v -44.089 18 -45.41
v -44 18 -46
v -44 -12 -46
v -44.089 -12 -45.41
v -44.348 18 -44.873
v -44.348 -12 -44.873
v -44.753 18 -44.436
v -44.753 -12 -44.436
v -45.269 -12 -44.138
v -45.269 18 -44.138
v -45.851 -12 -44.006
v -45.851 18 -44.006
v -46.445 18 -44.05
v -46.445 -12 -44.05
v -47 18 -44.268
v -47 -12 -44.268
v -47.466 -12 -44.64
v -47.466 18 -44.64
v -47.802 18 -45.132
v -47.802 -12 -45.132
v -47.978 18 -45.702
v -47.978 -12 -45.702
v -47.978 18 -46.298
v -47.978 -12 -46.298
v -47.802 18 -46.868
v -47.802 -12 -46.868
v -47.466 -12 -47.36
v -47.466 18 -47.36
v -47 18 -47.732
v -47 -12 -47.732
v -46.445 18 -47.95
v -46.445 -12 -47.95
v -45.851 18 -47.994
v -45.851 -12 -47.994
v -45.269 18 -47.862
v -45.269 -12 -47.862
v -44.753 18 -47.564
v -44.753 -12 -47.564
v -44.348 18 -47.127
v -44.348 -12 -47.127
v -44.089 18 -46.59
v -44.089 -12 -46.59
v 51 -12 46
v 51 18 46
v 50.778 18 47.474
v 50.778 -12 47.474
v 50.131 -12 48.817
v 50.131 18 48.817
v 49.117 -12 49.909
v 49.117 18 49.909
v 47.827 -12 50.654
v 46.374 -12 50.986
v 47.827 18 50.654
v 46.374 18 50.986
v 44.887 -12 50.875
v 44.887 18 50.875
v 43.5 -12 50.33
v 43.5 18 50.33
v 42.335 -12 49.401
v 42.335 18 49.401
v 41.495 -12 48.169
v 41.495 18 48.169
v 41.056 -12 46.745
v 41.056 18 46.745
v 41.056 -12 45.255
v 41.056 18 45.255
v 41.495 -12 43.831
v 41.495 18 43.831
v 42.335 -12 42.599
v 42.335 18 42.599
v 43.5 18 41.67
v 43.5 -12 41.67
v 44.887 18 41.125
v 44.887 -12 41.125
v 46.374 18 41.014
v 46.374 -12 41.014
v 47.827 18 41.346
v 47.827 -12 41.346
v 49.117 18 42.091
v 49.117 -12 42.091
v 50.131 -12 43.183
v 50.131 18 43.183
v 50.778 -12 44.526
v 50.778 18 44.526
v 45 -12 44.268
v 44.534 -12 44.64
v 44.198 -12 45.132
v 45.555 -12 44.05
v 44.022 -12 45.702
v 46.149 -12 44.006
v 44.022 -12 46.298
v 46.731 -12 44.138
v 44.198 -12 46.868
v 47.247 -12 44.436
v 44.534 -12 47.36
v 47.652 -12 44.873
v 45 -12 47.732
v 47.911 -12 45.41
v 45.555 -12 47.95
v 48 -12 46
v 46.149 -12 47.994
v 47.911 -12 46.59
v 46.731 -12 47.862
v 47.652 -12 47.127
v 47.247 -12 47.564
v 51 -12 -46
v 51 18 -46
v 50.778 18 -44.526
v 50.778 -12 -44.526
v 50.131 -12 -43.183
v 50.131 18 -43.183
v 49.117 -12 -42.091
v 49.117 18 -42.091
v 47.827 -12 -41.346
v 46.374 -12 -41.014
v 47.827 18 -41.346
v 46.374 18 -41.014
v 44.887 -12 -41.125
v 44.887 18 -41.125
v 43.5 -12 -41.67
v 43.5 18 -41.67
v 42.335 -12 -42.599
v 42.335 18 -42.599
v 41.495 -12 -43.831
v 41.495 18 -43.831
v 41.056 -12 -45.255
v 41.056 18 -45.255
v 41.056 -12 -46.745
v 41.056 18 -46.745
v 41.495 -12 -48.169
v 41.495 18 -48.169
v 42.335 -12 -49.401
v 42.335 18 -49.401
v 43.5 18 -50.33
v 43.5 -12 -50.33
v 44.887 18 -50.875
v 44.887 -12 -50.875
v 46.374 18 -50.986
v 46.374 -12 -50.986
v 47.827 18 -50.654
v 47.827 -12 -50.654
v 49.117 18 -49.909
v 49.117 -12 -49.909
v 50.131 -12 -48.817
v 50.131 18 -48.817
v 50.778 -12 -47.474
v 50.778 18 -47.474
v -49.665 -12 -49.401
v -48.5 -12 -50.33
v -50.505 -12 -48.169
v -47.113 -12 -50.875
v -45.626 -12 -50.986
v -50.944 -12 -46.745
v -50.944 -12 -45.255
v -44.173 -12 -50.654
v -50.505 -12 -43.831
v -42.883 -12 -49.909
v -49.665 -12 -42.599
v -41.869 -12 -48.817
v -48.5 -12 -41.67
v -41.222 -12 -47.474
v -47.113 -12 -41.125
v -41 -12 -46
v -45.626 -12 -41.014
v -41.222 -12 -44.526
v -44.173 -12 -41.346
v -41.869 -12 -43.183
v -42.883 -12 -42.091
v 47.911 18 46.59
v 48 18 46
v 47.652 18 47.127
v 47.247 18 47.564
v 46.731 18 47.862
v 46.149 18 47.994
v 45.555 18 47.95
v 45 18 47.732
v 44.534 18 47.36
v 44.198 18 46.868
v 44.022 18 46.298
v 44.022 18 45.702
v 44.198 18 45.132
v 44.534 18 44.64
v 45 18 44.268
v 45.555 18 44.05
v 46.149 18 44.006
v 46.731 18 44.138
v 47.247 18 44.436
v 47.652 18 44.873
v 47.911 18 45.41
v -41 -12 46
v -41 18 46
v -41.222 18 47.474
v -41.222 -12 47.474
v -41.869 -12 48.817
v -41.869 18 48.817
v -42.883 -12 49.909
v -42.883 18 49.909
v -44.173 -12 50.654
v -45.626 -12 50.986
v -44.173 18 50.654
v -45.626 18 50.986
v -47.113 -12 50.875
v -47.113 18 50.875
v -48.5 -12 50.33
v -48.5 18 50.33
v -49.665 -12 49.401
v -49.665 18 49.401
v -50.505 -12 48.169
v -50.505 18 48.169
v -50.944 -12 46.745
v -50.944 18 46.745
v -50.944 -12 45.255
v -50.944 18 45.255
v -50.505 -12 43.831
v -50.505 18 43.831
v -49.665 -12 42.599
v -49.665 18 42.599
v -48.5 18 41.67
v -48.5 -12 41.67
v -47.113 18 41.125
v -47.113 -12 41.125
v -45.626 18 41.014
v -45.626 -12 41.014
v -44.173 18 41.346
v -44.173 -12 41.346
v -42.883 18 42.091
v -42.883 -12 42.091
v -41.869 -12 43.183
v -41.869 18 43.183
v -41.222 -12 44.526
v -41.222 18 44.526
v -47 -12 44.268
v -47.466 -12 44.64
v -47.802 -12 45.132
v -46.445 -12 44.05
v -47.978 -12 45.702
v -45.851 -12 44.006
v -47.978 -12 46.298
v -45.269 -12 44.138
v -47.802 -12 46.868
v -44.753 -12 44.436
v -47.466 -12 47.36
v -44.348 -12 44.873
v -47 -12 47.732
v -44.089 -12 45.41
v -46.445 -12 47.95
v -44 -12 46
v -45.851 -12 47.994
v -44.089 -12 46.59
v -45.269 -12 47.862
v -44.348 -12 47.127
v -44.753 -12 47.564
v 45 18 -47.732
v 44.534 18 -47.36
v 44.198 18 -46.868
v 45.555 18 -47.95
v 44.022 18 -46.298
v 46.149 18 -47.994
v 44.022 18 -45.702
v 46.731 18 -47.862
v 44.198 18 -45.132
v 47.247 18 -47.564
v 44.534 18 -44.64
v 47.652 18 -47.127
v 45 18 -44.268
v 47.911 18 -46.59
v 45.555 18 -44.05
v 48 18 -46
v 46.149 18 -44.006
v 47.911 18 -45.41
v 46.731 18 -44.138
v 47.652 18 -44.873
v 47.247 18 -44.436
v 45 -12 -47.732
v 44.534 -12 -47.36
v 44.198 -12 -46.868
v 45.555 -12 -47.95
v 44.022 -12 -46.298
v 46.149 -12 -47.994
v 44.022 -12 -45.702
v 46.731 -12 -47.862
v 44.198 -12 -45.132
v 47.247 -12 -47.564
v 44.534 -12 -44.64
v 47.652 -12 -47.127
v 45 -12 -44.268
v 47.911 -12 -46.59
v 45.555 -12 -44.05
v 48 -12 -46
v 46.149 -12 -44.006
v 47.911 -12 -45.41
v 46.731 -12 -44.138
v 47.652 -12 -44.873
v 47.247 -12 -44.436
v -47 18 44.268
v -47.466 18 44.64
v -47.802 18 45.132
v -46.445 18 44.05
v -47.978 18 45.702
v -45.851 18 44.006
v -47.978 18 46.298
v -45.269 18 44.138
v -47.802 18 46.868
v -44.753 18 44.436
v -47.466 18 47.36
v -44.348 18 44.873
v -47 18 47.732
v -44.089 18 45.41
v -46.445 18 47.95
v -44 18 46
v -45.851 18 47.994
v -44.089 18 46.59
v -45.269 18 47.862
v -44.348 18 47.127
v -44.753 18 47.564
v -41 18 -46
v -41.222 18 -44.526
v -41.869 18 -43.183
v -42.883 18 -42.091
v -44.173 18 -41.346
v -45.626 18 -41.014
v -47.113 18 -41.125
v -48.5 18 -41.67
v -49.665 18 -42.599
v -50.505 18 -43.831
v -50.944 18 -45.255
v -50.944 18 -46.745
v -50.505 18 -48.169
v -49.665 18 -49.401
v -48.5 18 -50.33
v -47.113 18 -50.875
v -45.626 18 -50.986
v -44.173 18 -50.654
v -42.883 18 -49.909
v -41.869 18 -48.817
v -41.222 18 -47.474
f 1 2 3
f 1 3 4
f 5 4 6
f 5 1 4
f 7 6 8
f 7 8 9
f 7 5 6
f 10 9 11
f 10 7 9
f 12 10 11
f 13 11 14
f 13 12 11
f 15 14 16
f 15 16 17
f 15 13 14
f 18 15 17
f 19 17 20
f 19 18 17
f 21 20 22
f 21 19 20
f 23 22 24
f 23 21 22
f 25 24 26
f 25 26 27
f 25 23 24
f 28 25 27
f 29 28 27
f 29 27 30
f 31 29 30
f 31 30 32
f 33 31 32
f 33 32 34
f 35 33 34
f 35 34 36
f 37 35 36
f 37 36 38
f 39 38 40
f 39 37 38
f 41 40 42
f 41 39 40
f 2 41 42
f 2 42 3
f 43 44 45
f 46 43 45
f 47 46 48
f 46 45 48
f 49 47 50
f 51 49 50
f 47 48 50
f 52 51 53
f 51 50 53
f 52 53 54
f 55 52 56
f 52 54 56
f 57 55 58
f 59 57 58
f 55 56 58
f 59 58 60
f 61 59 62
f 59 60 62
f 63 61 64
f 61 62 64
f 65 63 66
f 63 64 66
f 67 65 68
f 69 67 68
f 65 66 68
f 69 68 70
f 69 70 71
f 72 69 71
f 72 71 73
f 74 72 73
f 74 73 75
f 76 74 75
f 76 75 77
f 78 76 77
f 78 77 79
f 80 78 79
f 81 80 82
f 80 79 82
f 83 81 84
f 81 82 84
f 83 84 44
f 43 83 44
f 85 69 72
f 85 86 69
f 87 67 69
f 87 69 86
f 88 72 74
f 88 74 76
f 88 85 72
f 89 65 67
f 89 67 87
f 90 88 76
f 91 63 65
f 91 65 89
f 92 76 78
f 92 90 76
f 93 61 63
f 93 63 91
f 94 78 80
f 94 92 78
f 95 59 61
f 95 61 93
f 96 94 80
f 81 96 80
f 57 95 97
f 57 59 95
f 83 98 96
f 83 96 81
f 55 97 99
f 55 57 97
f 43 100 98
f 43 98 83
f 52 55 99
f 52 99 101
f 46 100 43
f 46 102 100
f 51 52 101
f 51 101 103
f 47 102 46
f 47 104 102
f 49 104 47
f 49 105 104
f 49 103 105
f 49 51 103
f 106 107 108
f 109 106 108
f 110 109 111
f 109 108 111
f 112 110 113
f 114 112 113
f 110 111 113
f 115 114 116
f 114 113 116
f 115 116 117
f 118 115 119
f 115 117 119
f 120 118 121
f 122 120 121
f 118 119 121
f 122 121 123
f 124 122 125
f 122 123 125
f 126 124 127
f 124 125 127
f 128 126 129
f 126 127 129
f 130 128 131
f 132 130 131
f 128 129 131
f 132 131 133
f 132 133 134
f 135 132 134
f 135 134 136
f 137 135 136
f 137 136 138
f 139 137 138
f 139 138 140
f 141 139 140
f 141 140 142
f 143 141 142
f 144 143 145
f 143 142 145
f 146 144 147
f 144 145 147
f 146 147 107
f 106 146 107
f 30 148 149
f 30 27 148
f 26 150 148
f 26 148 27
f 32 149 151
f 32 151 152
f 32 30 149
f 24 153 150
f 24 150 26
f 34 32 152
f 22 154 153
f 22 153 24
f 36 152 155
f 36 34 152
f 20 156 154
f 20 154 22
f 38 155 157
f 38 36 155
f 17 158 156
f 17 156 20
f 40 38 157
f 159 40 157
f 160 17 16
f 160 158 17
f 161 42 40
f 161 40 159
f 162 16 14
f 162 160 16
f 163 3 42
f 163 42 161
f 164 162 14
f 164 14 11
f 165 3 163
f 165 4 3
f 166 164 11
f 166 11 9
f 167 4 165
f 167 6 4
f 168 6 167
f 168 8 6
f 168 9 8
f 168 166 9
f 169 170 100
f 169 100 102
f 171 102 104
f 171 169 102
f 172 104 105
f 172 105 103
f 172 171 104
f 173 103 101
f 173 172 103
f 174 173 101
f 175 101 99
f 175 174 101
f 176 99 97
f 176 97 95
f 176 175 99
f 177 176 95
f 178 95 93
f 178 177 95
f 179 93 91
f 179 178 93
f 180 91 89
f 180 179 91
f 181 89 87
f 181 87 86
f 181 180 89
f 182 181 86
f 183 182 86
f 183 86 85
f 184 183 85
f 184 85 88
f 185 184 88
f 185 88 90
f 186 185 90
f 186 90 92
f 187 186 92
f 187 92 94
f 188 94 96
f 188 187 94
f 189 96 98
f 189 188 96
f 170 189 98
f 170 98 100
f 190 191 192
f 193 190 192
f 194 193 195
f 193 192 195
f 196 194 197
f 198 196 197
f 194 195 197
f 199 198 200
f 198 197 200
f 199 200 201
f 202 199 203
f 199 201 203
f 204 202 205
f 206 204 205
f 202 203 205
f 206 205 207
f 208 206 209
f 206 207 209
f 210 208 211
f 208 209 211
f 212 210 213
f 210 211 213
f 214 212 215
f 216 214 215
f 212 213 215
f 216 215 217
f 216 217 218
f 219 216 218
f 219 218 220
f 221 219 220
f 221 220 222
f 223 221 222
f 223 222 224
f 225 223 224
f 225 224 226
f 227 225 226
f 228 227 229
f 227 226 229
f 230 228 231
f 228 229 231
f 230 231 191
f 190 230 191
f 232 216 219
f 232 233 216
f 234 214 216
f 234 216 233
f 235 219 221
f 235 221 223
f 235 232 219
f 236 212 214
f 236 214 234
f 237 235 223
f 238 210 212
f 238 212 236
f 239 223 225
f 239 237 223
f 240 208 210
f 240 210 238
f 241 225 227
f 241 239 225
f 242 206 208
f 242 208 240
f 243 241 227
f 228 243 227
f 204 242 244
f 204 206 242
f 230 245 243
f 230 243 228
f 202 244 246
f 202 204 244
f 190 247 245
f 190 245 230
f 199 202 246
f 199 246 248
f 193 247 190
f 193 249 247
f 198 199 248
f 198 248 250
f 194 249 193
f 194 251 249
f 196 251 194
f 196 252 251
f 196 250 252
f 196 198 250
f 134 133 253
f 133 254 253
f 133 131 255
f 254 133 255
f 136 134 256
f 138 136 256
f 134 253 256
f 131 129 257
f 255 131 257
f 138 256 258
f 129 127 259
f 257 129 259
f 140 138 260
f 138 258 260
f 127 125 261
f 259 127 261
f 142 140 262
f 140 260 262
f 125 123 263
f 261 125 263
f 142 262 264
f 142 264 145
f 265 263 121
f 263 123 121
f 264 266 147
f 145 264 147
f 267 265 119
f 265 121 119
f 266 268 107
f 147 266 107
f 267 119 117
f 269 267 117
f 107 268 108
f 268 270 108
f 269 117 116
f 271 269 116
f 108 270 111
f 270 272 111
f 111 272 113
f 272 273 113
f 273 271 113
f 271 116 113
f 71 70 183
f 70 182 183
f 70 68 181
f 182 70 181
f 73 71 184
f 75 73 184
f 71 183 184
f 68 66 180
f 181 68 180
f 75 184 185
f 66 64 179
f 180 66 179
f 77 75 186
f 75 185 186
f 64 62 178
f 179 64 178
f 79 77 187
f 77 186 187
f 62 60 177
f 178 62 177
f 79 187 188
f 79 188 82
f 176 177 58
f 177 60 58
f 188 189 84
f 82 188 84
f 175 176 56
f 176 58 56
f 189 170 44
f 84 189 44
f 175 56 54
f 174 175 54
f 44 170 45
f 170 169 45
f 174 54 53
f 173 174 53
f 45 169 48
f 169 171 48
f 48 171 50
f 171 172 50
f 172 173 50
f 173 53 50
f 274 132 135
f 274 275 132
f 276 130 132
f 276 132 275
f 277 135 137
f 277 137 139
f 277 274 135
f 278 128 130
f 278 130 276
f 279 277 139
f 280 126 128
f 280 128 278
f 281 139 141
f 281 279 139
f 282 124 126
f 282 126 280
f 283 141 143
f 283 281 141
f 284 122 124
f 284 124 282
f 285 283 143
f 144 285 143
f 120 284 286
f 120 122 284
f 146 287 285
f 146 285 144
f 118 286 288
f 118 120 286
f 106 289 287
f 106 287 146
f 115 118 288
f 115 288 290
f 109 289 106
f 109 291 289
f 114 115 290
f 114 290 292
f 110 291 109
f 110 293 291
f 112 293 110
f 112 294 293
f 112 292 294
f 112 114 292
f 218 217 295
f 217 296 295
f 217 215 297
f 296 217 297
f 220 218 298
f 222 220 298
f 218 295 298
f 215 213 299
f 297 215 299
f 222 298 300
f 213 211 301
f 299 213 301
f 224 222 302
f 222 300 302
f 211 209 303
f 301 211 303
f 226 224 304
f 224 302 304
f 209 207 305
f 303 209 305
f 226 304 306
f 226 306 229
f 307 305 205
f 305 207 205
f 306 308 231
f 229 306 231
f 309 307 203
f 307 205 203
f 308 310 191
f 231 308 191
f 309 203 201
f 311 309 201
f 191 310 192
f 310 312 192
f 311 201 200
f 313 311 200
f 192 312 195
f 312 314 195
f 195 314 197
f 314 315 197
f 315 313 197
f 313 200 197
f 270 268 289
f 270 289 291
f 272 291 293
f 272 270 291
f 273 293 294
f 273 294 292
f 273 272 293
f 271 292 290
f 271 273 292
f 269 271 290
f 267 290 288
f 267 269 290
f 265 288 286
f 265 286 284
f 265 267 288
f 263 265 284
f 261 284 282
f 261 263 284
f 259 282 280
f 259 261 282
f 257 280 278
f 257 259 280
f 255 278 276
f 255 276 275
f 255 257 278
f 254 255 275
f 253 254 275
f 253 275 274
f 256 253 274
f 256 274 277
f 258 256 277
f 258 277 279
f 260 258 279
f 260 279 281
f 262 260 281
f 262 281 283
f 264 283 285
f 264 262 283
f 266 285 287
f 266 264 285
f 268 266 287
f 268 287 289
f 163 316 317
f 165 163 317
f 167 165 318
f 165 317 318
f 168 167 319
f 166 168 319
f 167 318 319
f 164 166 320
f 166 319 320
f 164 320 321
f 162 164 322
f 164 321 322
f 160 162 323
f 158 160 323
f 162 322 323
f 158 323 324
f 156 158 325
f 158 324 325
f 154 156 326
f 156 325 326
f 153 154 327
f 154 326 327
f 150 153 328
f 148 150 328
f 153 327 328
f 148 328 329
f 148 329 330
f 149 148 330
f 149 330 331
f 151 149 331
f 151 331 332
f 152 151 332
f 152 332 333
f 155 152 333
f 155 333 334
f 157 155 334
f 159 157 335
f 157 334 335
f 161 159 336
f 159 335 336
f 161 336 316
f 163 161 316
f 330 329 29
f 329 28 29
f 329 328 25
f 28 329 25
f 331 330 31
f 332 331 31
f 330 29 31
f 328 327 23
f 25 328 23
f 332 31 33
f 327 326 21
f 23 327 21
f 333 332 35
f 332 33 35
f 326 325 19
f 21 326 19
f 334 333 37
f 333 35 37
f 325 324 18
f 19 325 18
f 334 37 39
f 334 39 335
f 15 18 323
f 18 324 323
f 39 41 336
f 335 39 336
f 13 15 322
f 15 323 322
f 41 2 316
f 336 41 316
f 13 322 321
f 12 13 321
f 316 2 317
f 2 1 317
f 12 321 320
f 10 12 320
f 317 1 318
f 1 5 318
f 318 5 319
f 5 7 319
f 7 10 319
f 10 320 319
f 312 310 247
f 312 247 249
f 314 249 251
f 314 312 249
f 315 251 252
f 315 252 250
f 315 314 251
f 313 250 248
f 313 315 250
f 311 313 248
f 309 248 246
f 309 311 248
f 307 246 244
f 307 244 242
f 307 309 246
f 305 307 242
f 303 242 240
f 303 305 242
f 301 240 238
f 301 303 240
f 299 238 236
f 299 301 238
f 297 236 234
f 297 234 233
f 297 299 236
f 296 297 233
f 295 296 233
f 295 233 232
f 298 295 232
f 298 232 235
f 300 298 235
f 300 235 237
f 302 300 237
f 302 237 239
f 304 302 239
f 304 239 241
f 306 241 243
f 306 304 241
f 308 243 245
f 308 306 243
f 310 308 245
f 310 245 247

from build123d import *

# Parameters (mm, degrees)
TUBE001_R     = 5
TUBE001_R_2   = 2
TUBE001_DEPTH = 30
TUBE002_R     = 5
TUBE002_R_2   = 2
TUBE002_DEPTH = 30
TUBE003_R     = 5
TUBE003_R_2   = 2
TUBE003_DEPTH = 30
TUBE_R        = 5
TUBE_R_2      = 2
TUBE_DEPTH    = 30


with BuildPart() as tube001:
    # Tube001 → Tube001 (new body)
    with BuildSketch(Plane(origin=(-46, 18, 46), x_dir=(1, 0, 0), z_dir=(0, -1, 0))):
        Circle(TUBE001_R)
        Circle(TUBE001_R_2, mode=Mode.SUBTRACT)
    extrude(amount=TUBE001_DEPTH)


with BuildPart() as tube002:
    # Tube002 → Tube002 (new body)
    with BuildSketch(Plane(origin=(-46, 18, -46), x_dir=(1, 0, 0), z_dir=(0, -1, 0))):
        Circle(TUBE002_R)
        Circle(TUBE002_R_2, mode=Mode.SUBTRACT)
    extrude(amount=TUBE002_DEPTH)


with BuildPart() as tube003:
    # Tube003 → Tube003 (new body)
    with BuildSketch(Plane(origin=(46, 18, -46), x_dir=(1, 0, 0), z_dir=(0, -1, 0))):
        Circle(TUBE003_R)
        Circle(TUBE003_R_2, mode=Mode.SUBTRACT)
    extrude(amount=TUBE003_DEPTH)


with BuildPart() as m3_screws:
    # Tube → Tube (new body)
    with BuildSketch(Plane(origin=(46, 18, 46), x_dir=(1, 0, 0), z_dir=(0, -1, 0))):
        Circle(TUBE_R)
        Circle(TUBE_R_2, mode=Mode.SUBTRACT)
    extrude(amount=TUBE_DEPTH)

    # Fusion001: union Tube001, Tube002, Tube003
    add(tube001.part)
    add(tube002.part)
    add(tube003.part)


solid = m3_screws.part
